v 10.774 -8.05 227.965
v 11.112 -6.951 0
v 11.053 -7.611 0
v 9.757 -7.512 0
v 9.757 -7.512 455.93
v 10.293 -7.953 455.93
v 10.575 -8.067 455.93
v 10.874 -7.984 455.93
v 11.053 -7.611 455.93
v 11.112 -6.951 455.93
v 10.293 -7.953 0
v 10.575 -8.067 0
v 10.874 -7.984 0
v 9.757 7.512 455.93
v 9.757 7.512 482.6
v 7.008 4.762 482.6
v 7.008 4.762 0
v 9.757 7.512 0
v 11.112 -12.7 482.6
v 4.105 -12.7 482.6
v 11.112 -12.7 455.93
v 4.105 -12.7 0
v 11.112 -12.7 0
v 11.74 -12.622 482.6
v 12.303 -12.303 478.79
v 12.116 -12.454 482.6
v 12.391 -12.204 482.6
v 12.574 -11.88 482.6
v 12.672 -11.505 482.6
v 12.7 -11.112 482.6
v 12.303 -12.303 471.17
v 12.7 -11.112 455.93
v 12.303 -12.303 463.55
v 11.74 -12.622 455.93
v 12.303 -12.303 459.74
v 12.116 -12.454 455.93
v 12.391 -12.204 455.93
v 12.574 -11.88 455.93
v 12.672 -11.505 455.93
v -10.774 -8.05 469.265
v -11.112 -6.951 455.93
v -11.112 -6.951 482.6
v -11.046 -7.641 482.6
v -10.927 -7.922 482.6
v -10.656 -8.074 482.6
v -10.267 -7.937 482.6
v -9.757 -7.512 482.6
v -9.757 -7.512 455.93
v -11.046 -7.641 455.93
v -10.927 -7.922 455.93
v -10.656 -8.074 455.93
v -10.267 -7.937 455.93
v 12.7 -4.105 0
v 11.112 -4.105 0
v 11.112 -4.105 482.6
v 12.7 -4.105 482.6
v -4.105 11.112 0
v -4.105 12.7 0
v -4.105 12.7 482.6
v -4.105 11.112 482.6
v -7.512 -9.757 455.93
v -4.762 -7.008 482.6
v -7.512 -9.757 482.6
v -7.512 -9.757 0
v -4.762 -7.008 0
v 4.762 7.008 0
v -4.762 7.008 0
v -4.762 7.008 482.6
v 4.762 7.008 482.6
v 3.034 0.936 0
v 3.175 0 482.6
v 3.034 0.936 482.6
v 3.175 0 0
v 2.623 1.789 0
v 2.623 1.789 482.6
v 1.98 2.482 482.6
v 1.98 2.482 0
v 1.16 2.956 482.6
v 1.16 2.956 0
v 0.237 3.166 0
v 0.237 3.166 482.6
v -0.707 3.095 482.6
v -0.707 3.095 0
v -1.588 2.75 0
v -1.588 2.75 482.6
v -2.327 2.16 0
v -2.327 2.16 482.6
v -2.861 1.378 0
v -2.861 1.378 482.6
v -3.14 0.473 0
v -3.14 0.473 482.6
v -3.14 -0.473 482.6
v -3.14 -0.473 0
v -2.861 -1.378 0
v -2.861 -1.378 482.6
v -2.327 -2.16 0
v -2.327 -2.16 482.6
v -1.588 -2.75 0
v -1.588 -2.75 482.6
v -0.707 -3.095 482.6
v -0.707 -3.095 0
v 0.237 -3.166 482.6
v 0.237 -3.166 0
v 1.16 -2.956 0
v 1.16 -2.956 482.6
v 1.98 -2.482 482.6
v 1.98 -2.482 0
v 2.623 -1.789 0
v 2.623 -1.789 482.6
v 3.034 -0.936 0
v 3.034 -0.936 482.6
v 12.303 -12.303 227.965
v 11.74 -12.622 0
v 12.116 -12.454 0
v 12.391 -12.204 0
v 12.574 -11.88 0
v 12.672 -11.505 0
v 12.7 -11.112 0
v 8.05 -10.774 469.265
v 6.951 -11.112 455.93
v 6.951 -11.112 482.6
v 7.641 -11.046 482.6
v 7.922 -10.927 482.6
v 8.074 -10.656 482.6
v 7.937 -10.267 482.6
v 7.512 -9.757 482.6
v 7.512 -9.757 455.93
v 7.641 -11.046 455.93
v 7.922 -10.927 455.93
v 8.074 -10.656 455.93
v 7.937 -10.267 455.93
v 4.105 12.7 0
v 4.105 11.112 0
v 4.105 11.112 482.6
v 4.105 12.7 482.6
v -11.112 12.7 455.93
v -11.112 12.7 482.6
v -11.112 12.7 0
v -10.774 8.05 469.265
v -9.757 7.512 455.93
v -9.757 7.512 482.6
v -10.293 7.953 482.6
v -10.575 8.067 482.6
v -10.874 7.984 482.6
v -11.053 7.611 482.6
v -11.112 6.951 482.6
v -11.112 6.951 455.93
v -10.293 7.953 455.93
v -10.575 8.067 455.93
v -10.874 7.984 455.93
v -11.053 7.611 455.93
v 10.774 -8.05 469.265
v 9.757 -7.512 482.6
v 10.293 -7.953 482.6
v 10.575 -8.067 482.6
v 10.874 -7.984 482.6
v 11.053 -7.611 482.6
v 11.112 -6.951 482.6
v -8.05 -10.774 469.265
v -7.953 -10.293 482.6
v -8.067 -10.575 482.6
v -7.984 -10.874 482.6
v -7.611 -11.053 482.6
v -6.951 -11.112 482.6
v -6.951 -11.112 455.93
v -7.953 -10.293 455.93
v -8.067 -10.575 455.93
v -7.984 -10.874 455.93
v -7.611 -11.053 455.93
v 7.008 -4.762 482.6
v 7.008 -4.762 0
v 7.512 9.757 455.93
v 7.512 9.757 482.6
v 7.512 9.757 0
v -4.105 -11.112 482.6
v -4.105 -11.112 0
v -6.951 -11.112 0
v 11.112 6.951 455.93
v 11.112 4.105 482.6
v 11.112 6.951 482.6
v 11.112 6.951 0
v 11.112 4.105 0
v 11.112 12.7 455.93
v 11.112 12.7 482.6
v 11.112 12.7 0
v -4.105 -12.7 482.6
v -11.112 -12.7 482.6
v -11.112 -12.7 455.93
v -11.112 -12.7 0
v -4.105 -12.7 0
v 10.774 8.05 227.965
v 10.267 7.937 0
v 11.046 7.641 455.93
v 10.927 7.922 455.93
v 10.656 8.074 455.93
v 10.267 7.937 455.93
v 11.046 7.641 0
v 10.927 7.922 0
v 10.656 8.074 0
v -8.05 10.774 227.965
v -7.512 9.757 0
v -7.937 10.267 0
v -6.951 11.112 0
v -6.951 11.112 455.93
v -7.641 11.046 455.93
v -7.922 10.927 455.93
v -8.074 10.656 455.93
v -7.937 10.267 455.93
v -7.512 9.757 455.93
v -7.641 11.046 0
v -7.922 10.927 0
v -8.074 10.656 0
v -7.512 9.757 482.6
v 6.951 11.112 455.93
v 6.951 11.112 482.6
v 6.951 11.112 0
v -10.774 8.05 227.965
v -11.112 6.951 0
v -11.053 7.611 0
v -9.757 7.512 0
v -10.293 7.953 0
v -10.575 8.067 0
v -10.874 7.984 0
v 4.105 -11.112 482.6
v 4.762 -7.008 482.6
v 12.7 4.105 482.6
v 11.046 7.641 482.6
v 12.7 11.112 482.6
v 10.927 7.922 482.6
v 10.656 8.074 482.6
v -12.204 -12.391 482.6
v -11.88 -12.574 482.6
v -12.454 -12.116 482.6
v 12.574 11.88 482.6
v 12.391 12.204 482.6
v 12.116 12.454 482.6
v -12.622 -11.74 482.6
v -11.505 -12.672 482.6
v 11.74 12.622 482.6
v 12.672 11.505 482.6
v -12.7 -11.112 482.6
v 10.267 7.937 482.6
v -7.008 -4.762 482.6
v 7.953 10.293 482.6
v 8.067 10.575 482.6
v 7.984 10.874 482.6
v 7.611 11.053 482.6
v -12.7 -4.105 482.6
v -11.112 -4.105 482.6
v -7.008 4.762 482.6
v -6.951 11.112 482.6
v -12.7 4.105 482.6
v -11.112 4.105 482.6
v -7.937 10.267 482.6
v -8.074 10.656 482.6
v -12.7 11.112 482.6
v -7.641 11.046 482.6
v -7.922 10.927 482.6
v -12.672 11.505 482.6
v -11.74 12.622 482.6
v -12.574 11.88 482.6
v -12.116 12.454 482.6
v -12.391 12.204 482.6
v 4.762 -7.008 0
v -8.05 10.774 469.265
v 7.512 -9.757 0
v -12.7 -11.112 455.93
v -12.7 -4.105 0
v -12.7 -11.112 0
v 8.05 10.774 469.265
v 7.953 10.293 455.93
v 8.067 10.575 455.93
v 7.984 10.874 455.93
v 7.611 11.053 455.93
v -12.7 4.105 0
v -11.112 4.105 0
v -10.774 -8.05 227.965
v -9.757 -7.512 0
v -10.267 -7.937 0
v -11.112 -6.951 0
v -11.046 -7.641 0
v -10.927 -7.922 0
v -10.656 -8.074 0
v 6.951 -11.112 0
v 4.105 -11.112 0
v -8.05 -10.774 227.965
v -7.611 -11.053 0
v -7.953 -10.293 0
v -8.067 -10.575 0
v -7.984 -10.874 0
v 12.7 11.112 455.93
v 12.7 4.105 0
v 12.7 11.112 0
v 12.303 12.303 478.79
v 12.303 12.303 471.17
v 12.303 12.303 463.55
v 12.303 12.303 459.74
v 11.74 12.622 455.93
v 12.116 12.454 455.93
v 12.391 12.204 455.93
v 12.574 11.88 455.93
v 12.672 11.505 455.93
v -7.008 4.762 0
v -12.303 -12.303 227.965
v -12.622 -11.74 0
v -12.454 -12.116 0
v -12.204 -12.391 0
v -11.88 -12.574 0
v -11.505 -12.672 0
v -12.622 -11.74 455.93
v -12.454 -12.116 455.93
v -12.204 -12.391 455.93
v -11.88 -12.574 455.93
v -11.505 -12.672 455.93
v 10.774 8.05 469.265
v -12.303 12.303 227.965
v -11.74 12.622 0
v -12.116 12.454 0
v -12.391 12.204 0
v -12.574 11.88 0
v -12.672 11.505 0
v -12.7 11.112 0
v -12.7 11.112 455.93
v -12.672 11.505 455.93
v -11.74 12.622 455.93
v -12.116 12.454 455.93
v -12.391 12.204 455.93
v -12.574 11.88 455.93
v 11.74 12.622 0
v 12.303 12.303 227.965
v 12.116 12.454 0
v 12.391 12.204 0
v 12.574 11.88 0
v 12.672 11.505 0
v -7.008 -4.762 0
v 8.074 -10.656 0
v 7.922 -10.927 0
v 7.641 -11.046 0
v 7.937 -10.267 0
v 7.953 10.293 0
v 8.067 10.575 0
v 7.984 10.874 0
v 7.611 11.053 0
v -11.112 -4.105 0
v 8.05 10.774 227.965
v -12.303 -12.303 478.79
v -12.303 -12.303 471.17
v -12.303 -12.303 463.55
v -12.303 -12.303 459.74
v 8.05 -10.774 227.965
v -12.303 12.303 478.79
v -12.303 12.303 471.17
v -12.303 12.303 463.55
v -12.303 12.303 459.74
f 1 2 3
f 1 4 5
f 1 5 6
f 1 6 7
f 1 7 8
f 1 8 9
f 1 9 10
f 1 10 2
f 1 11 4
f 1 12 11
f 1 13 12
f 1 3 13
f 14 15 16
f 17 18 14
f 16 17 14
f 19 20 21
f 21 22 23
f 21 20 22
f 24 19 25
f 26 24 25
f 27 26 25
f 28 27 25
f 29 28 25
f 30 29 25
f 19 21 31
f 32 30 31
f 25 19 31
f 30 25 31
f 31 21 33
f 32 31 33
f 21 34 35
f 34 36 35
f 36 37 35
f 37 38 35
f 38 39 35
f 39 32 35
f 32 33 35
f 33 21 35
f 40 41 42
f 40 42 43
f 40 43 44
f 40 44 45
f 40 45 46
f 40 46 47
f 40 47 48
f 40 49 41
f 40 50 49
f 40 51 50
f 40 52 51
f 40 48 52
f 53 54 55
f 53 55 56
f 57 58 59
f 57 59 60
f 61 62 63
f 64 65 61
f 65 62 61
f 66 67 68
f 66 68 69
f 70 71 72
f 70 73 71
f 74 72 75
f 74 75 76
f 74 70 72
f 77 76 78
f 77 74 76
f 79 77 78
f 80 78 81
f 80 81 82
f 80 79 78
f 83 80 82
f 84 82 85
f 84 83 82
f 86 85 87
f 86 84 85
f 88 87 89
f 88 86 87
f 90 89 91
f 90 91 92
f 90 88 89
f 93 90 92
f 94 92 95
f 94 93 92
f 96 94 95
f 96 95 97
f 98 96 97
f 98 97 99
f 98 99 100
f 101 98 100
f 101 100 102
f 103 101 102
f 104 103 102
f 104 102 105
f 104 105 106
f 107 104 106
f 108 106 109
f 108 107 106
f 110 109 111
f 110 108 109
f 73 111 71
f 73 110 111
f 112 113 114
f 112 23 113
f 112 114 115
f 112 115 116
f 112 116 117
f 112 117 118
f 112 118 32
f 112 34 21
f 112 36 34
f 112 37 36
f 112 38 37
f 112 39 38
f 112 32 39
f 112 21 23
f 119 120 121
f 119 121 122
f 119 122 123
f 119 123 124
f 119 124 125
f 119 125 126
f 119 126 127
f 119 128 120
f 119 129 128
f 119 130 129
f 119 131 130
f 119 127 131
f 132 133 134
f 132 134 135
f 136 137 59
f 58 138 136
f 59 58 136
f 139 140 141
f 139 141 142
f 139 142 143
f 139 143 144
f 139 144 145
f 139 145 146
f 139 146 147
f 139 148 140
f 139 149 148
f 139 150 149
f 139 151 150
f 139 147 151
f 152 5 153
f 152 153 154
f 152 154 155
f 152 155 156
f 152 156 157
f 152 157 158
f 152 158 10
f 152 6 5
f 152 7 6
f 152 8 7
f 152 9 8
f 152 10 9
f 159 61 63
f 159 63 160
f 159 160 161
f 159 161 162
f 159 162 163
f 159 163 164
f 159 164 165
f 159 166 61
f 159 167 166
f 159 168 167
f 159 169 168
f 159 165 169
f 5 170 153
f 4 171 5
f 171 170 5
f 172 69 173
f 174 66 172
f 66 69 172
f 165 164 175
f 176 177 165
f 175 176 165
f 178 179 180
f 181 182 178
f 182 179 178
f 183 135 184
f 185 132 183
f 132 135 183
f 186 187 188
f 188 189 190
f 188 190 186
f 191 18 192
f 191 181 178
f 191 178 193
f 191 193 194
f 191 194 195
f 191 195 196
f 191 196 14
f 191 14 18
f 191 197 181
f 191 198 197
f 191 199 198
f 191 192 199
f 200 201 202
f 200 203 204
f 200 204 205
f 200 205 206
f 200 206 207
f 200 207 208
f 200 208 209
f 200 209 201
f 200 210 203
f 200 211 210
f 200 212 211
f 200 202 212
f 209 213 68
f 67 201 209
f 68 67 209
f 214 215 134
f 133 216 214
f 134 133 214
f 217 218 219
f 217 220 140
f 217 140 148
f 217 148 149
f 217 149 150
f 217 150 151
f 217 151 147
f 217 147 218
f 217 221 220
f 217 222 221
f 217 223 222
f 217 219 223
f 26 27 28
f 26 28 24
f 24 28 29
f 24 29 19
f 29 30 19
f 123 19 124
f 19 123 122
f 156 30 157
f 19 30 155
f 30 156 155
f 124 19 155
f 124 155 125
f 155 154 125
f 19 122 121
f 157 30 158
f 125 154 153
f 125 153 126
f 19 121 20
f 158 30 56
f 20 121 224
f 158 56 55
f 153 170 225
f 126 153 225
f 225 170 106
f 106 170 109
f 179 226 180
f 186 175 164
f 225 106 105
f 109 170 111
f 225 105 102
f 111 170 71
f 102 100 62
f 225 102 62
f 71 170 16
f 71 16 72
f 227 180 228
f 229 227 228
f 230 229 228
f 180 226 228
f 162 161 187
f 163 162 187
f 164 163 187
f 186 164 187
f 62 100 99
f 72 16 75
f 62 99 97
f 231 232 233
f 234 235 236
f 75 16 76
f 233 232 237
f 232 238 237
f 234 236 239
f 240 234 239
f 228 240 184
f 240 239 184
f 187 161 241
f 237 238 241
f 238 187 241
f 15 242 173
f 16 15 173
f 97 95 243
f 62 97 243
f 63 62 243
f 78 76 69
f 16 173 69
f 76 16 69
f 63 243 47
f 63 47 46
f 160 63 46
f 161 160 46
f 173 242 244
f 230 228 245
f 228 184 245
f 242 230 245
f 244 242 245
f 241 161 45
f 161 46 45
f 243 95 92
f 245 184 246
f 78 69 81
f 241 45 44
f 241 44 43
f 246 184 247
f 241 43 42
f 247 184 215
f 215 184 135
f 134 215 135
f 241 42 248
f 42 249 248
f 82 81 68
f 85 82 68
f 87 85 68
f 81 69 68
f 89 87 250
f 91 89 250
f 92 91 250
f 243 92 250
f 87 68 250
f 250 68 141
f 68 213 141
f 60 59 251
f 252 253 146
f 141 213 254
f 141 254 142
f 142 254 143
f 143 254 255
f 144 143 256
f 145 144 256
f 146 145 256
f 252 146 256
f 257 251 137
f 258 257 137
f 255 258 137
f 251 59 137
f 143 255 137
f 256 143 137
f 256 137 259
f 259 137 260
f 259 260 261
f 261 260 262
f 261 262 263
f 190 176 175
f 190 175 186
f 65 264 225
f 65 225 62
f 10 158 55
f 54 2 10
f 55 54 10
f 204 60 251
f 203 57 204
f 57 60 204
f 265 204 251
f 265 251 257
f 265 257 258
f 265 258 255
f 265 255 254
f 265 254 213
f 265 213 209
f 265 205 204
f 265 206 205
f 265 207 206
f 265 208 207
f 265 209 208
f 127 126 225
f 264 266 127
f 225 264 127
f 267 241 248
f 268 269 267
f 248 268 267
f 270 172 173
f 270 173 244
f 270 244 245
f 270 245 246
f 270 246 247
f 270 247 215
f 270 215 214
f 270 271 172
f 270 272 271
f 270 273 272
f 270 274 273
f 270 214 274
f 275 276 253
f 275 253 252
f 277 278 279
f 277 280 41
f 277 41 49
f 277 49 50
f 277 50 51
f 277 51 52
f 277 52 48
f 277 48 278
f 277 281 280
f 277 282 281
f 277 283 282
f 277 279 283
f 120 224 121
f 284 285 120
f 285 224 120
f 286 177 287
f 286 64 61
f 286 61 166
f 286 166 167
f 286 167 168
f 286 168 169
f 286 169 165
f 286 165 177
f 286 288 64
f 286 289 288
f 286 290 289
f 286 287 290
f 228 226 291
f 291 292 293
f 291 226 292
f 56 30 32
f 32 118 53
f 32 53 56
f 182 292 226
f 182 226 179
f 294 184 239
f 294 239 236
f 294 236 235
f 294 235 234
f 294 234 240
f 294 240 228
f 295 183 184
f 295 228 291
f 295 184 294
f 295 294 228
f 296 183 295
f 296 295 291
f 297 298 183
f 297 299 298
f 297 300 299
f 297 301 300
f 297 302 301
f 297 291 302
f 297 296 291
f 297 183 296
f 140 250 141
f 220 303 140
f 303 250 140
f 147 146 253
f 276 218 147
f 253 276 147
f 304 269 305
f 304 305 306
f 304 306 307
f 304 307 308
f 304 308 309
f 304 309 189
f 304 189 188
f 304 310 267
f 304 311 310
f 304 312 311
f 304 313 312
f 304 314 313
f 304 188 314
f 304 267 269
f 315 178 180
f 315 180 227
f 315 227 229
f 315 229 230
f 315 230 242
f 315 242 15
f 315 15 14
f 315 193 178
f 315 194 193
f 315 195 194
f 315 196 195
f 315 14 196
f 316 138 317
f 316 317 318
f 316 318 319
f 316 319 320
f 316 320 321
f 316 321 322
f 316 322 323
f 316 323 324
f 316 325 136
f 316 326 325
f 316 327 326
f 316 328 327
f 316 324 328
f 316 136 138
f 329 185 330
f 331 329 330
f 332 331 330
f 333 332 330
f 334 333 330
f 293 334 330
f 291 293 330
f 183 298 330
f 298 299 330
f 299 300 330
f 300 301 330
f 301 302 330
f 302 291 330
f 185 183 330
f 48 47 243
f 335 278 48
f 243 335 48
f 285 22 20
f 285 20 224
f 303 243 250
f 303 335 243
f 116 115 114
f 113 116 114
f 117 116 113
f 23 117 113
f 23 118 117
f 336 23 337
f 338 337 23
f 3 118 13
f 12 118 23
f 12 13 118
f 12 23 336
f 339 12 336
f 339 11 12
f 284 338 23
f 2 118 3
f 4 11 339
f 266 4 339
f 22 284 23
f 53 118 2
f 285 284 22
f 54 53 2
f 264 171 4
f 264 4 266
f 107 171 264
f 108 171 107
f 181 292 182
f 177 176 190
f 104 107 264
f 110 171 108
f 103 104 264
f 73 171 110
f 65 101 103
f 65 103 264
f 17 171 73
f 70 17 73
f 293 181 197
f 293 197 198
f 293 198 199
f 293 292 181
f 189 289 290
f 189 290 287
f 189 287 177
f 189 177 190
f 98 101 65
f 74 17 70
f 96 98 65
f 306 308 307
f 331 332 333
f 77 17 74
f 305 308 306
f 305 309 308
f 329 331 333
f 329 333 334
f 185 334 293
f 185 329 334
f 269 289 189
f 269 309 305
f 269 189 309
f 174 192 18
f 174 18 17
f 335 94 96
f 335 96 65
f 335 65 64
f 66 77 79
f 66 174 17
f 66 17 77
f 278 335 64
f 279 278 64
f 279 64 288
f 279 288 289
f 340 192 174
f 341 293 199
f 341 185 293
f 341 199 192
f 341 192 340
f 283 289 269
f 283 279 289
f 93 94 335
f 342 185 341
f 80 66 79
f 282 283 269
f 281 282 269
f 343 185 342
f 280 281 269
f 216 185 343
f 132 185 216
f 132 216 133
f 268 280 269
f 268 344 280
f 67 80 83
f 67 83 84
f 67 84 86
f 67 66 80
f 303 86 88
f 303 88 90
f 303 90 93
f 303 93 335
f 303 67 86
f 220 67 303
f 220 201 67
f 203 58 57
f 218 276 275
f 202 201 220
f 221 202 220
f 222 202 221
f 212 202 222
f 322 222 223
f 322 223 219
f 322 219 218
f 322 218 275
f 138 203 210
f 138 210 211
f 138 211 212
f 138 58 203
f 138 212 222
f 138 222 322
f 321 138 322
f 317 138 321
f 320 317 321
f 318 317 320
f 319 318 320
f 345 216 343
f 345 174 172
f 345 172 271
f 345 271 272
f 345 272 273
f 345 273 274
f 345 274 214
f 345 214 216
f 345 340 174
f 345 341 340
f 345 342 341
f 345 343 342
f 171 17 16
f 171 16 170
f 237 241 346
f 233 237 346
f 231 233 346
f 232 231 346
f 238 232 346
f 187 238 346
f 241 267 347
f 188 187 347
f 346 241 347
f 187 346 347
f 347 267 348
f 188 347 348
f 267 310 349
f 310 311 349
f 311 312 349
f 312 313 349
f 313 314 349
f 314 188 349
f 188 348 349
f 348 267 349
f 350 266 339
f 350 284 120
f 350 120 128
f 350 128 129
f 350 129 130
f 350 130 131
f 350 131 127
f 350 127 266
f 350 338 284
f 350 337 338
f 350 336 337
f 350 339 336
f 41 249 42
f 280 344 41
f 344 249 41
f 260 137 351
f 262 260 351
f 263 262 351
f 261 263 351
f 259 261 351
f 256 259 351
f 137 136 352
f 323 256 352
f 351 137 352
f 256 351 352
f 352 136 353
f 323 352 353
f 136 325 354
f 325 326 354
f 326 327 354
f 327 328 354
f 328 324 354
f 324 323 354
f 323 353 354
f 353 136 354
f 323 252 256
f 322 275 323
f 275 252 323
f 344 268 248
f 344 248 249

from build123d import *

# Parameters (mm, degrees)
F0_W        = 25.4
F0_H        = 25.4
F1_DEPTH    = 455.93
F3_DEPTH    = 455.93
F4_R        = 3.175
F5_DEPTH    = 455.93
F6_T1_DEPTH = 463.8675
F7_T1_DEPTH = 455.93
F8_DEPTH    = 26.67


# Not quite as in the source:
# - a fillet or chamfer that OpenCascade refuses, or shapes differently, is made with other operations: its cross-section is extruded or revolved along the edge and cut away or added


with BuildPart() as f1:
    # F0 (on Top) → F1 (new body)
    with BuildSketch(Plane.XY):
        Rectangle(F0_W, F0_H)
    extrude(amount=F1_DEPTH)

    # F2 (on face) → F3 (cut)
    with BuildSketch(Plane.XY.offset(455.93)):
        Polygon((-7.0075640303, -4.7625), (-7.0075640303, 4.7625), (-11.1125, 8.8674359697), (-11.1125, 4.1049359697), (-12.7, 4.1049359697), (-12.7, -4.1049359697), (-11.1125, -4.1049359697), (-11.1125, -8.8674359697), align=None)
        Polygon((4.1049359697, 12.7), (-4.1049359697, 12.7), (-4.1049359697, 11.1125), (-8.8674359697, 11.1125), (-4.7625, 7.0075640303), (4.7625, 7.0075640303), (8.8674359697, 11.1125), (4.1049359697, 11.1125), align=None)
        Polygon((12.7, -4.1049359697), (12.7, 4.1049359697), (11.1125, 4.1049359697), (11.1125, 8.8674359697), (7.0075640303, 4.7625), (7.0075640303, -4.7625), (11.1125, -8.8674359697), (11.1125, -4.1049359697), align=None)
        Polygon((-4.1049359697, -11.1125), (-4.1049359697, -12.7), (4.1049359697, -12.7), (4.1049359697, -11.1125), (8.8674359697, -11.1125), (4.7625, -7.0075640303), (-4.7625, -7.0075640303), (-8.8674359697, -11.1125), align=None)
    extrude(amount=-F3_DEPTH, mode=Mode.SUBTRACT)

    # F4 (on face) → F5 (cut)
    with BuildSketch(Plane.XY.offset(455.93)):
        Circle(F4_R)
    extrude(amount=-F5_DEPTH, mode=Mode.SUBTRACT)

    # F6: fillet of radius 1.5875 on 4 edges, made by hand

    # F6_s2 → F6_t1 (cut)
    with BuildSketch(Plane.XY.offset(-3.96875)):
        with BuildLine():
            add(Edge.make_bspline(
                [(-12.7, 11.1125), (-12.7, 12.7), (-11.1125, 12.7)],
                knots=[0, 0, 0, 1, 1, 1], degree=2, weights=[1, 1, 1]))
            Line((-11.1125, 12.7), (-12.7, 12.7))
            Line((-12.7, 12.7), (-12.7, 11.1125))
        make_face()
        with BuildLine():
            add(Edge.make_bspline(
                [(12.7, 11.1125), (12.7, 12.7), (11.1125, 12.7)],
                knots=[0, 0, 0, 1, 1, 1], degree=2, weights=[1, 1, 1]))
            Line((11.1125, 12.7), (12.7, 12.7))
            Line((12.7, 12.7), (12.7, 11.1125))
        make_face()
        with BuildLine():
            add(Edge.make_bspline(
                [(12.7, -11.1125), (12.7, -12.7), (11.1125, -12.7)],
                knots=[0, 0, 0, 1, 1, 1], degree=2, weights=[1, 1, 1]))
            Line((11.1125, -12.7), (12.7, -12.7))
            Line((12.7, -12.7), (12.7, -11.1125))
        make_face()
        with BuildLine():
            add(Edge.make_bspline(
                [(-11.1125, -12.7), (-12.7, -12.7), (-12.7, -11.1125)],
                knots=[0, 0, 0, 1, 1, 1], degree=2, weights=[1, 1, 1]))
            Line((-12.7, -11.1125), (-12.7, -12.7))
            Line((-12.7, -12.7), (-11.1125, -12.7))
        make_face()
    extrude(amount=F6_T1_DEPTH, mode=Mode.SUBTRACT)

    # F7: fillet of radius 0.79375 on 8 edges, made by hand

    # F7_s2 → F7_t1 (join)
    with BuildSketch(Plane.XY):
        with BuildLine():
            add(Edge.make_bspline(
                [(-9.7574839924, 7.5124199622), (-11.1125, 8.8674359697), (-11.1125, 6.9511539546)],
                knots=[0, 0, 0, 1, 1, 1], degree=2, weights=[1, 1, 1]))
            Line((-11.1125, 6.9511539546), (-11.1125, 8.8674359697))
            Line((-11.1125, 8.8674359697), (-9.7574839924, 7.5124199622))
        make_face()
        with BuildLine():
            add(Edge.make_bspline(
                [(11.1125, 6.9511539546), (11.1125, 8.8674359697), (9.7574839924, 7.5124199622)],
                knots=[0, 0, 0, 1, 1, 1], degree=2, weights=[1, 1, 1]))
            Line((9.7574839924, 7.5124199622), (11.1125, 8.8674359697))
            Line((11.1125, 8.8674359697), (11.1125, 6.9511539546))
        make_face()
        with BuildLine():
            add(Edge.make_bspline(
                [(9.7574839924, -7.5124199622), (11.1125, -8.8674359697), (11.1125, -6.9511539546)],
                knots=[0, 0, 0, 1, 1, 1], degree=2, weights=[1, 1, 1]))
            Line((11.1125, -6.9511539546), (11.1125, -8.8674359697))
            Line((11.1125, -8.8674359697), (9.7574839924, -7.5124199622))
        make_face()
        with BuildLine():
            add(Edge.make_bspline(
                [(-11.1125, -6.9511539546), (-11.1125, -8.8674359697), (-9.7574839924, -7.5124199622)],
                knots=[0, 0, 0, 1, 1, 1], degree=2, weights=[1, 1, 1]))
            Line((-9.7574839924, -7.5124199622), (-11.1125, -8.8674359697))
            Line((-11.1125, -8.8674359697), (-11.1125, -6.9511539546))
        make_face()
        with BuildLine():
            add(Edge.make_bspline(
                [(-7.5124199622, -9.7574839924), (-8.8674359697, -11.1125), (-6.9511539546, -11.1125)],
                knots=[0, 0, 0, 1, 1, 1], degree=2, weights=[1, 1, 1]))
            Line((-6.9511539546, -11.1125), (-8.8674359697, -11.1125))
            Line((-8.8674359697, -11.1125), (-7.5124199622, -9.7574839924))
        make_face()
        with BuildLine():
            add(Edge.make_bspline(
                [(6.9511539546, -11.1125), (8.8674359697, -11.1125), (7.5124199622, -9.7574839924)],
                knots=[0, 0, 0, 1, 1, 1], degree=2, weights=[1, 1, 1]))
            Line((7.5124199622, -9.7574839924), (8.8674359697, -11.1125))
            Line((8.8674359697, -11.1125), (6.9511539546, -11.1125))
        make_face()
        with BuildLine():
            add(Edge.make_bspline(
                [(7.5124199622, 9.7574839924), (8.8674359697, 11.1125), (6.9511539546, 11.1125)],
                knots=[0, 0, 0, 1, 1, 1], degree=2, weights=[1, 1, 1]))
            Line((6.9511539546, 11.1125), (8.8674359697, 11.1125))
            Line((8.8674359697, 11.1125), (7.5124199622, 9.7574839924))
        make_face()
        with BuildLine():
            add(Edge.make_bspline(
                [(-6.9511539546, 11.1125), (-8.8674359697, 11.1125), (-7.5124199622, 9.7574839924)],
                knots=[0, 0, 0, 1, 1, 1], degree=2, weights=[1, 1, 1]))
            Line((-7.5124199622, 9.7574839924), (-8.8674359697, 11.1125))
            Line((-8.8674359697, 11.1125), (-6.9511539546, 11.1125))
        make_face()
    extrude(amount=F7_T1_DEPTH)

    # F8 (add): a face of the model
    f8_faces = [f1.faces().sort_by_distance(p)[0] for p in [
        (4.4641462174, -11.90625, 455.93),
    ]]
    extrude(f8_faces, amount=F8_DEPTH)


solid = f1.part
